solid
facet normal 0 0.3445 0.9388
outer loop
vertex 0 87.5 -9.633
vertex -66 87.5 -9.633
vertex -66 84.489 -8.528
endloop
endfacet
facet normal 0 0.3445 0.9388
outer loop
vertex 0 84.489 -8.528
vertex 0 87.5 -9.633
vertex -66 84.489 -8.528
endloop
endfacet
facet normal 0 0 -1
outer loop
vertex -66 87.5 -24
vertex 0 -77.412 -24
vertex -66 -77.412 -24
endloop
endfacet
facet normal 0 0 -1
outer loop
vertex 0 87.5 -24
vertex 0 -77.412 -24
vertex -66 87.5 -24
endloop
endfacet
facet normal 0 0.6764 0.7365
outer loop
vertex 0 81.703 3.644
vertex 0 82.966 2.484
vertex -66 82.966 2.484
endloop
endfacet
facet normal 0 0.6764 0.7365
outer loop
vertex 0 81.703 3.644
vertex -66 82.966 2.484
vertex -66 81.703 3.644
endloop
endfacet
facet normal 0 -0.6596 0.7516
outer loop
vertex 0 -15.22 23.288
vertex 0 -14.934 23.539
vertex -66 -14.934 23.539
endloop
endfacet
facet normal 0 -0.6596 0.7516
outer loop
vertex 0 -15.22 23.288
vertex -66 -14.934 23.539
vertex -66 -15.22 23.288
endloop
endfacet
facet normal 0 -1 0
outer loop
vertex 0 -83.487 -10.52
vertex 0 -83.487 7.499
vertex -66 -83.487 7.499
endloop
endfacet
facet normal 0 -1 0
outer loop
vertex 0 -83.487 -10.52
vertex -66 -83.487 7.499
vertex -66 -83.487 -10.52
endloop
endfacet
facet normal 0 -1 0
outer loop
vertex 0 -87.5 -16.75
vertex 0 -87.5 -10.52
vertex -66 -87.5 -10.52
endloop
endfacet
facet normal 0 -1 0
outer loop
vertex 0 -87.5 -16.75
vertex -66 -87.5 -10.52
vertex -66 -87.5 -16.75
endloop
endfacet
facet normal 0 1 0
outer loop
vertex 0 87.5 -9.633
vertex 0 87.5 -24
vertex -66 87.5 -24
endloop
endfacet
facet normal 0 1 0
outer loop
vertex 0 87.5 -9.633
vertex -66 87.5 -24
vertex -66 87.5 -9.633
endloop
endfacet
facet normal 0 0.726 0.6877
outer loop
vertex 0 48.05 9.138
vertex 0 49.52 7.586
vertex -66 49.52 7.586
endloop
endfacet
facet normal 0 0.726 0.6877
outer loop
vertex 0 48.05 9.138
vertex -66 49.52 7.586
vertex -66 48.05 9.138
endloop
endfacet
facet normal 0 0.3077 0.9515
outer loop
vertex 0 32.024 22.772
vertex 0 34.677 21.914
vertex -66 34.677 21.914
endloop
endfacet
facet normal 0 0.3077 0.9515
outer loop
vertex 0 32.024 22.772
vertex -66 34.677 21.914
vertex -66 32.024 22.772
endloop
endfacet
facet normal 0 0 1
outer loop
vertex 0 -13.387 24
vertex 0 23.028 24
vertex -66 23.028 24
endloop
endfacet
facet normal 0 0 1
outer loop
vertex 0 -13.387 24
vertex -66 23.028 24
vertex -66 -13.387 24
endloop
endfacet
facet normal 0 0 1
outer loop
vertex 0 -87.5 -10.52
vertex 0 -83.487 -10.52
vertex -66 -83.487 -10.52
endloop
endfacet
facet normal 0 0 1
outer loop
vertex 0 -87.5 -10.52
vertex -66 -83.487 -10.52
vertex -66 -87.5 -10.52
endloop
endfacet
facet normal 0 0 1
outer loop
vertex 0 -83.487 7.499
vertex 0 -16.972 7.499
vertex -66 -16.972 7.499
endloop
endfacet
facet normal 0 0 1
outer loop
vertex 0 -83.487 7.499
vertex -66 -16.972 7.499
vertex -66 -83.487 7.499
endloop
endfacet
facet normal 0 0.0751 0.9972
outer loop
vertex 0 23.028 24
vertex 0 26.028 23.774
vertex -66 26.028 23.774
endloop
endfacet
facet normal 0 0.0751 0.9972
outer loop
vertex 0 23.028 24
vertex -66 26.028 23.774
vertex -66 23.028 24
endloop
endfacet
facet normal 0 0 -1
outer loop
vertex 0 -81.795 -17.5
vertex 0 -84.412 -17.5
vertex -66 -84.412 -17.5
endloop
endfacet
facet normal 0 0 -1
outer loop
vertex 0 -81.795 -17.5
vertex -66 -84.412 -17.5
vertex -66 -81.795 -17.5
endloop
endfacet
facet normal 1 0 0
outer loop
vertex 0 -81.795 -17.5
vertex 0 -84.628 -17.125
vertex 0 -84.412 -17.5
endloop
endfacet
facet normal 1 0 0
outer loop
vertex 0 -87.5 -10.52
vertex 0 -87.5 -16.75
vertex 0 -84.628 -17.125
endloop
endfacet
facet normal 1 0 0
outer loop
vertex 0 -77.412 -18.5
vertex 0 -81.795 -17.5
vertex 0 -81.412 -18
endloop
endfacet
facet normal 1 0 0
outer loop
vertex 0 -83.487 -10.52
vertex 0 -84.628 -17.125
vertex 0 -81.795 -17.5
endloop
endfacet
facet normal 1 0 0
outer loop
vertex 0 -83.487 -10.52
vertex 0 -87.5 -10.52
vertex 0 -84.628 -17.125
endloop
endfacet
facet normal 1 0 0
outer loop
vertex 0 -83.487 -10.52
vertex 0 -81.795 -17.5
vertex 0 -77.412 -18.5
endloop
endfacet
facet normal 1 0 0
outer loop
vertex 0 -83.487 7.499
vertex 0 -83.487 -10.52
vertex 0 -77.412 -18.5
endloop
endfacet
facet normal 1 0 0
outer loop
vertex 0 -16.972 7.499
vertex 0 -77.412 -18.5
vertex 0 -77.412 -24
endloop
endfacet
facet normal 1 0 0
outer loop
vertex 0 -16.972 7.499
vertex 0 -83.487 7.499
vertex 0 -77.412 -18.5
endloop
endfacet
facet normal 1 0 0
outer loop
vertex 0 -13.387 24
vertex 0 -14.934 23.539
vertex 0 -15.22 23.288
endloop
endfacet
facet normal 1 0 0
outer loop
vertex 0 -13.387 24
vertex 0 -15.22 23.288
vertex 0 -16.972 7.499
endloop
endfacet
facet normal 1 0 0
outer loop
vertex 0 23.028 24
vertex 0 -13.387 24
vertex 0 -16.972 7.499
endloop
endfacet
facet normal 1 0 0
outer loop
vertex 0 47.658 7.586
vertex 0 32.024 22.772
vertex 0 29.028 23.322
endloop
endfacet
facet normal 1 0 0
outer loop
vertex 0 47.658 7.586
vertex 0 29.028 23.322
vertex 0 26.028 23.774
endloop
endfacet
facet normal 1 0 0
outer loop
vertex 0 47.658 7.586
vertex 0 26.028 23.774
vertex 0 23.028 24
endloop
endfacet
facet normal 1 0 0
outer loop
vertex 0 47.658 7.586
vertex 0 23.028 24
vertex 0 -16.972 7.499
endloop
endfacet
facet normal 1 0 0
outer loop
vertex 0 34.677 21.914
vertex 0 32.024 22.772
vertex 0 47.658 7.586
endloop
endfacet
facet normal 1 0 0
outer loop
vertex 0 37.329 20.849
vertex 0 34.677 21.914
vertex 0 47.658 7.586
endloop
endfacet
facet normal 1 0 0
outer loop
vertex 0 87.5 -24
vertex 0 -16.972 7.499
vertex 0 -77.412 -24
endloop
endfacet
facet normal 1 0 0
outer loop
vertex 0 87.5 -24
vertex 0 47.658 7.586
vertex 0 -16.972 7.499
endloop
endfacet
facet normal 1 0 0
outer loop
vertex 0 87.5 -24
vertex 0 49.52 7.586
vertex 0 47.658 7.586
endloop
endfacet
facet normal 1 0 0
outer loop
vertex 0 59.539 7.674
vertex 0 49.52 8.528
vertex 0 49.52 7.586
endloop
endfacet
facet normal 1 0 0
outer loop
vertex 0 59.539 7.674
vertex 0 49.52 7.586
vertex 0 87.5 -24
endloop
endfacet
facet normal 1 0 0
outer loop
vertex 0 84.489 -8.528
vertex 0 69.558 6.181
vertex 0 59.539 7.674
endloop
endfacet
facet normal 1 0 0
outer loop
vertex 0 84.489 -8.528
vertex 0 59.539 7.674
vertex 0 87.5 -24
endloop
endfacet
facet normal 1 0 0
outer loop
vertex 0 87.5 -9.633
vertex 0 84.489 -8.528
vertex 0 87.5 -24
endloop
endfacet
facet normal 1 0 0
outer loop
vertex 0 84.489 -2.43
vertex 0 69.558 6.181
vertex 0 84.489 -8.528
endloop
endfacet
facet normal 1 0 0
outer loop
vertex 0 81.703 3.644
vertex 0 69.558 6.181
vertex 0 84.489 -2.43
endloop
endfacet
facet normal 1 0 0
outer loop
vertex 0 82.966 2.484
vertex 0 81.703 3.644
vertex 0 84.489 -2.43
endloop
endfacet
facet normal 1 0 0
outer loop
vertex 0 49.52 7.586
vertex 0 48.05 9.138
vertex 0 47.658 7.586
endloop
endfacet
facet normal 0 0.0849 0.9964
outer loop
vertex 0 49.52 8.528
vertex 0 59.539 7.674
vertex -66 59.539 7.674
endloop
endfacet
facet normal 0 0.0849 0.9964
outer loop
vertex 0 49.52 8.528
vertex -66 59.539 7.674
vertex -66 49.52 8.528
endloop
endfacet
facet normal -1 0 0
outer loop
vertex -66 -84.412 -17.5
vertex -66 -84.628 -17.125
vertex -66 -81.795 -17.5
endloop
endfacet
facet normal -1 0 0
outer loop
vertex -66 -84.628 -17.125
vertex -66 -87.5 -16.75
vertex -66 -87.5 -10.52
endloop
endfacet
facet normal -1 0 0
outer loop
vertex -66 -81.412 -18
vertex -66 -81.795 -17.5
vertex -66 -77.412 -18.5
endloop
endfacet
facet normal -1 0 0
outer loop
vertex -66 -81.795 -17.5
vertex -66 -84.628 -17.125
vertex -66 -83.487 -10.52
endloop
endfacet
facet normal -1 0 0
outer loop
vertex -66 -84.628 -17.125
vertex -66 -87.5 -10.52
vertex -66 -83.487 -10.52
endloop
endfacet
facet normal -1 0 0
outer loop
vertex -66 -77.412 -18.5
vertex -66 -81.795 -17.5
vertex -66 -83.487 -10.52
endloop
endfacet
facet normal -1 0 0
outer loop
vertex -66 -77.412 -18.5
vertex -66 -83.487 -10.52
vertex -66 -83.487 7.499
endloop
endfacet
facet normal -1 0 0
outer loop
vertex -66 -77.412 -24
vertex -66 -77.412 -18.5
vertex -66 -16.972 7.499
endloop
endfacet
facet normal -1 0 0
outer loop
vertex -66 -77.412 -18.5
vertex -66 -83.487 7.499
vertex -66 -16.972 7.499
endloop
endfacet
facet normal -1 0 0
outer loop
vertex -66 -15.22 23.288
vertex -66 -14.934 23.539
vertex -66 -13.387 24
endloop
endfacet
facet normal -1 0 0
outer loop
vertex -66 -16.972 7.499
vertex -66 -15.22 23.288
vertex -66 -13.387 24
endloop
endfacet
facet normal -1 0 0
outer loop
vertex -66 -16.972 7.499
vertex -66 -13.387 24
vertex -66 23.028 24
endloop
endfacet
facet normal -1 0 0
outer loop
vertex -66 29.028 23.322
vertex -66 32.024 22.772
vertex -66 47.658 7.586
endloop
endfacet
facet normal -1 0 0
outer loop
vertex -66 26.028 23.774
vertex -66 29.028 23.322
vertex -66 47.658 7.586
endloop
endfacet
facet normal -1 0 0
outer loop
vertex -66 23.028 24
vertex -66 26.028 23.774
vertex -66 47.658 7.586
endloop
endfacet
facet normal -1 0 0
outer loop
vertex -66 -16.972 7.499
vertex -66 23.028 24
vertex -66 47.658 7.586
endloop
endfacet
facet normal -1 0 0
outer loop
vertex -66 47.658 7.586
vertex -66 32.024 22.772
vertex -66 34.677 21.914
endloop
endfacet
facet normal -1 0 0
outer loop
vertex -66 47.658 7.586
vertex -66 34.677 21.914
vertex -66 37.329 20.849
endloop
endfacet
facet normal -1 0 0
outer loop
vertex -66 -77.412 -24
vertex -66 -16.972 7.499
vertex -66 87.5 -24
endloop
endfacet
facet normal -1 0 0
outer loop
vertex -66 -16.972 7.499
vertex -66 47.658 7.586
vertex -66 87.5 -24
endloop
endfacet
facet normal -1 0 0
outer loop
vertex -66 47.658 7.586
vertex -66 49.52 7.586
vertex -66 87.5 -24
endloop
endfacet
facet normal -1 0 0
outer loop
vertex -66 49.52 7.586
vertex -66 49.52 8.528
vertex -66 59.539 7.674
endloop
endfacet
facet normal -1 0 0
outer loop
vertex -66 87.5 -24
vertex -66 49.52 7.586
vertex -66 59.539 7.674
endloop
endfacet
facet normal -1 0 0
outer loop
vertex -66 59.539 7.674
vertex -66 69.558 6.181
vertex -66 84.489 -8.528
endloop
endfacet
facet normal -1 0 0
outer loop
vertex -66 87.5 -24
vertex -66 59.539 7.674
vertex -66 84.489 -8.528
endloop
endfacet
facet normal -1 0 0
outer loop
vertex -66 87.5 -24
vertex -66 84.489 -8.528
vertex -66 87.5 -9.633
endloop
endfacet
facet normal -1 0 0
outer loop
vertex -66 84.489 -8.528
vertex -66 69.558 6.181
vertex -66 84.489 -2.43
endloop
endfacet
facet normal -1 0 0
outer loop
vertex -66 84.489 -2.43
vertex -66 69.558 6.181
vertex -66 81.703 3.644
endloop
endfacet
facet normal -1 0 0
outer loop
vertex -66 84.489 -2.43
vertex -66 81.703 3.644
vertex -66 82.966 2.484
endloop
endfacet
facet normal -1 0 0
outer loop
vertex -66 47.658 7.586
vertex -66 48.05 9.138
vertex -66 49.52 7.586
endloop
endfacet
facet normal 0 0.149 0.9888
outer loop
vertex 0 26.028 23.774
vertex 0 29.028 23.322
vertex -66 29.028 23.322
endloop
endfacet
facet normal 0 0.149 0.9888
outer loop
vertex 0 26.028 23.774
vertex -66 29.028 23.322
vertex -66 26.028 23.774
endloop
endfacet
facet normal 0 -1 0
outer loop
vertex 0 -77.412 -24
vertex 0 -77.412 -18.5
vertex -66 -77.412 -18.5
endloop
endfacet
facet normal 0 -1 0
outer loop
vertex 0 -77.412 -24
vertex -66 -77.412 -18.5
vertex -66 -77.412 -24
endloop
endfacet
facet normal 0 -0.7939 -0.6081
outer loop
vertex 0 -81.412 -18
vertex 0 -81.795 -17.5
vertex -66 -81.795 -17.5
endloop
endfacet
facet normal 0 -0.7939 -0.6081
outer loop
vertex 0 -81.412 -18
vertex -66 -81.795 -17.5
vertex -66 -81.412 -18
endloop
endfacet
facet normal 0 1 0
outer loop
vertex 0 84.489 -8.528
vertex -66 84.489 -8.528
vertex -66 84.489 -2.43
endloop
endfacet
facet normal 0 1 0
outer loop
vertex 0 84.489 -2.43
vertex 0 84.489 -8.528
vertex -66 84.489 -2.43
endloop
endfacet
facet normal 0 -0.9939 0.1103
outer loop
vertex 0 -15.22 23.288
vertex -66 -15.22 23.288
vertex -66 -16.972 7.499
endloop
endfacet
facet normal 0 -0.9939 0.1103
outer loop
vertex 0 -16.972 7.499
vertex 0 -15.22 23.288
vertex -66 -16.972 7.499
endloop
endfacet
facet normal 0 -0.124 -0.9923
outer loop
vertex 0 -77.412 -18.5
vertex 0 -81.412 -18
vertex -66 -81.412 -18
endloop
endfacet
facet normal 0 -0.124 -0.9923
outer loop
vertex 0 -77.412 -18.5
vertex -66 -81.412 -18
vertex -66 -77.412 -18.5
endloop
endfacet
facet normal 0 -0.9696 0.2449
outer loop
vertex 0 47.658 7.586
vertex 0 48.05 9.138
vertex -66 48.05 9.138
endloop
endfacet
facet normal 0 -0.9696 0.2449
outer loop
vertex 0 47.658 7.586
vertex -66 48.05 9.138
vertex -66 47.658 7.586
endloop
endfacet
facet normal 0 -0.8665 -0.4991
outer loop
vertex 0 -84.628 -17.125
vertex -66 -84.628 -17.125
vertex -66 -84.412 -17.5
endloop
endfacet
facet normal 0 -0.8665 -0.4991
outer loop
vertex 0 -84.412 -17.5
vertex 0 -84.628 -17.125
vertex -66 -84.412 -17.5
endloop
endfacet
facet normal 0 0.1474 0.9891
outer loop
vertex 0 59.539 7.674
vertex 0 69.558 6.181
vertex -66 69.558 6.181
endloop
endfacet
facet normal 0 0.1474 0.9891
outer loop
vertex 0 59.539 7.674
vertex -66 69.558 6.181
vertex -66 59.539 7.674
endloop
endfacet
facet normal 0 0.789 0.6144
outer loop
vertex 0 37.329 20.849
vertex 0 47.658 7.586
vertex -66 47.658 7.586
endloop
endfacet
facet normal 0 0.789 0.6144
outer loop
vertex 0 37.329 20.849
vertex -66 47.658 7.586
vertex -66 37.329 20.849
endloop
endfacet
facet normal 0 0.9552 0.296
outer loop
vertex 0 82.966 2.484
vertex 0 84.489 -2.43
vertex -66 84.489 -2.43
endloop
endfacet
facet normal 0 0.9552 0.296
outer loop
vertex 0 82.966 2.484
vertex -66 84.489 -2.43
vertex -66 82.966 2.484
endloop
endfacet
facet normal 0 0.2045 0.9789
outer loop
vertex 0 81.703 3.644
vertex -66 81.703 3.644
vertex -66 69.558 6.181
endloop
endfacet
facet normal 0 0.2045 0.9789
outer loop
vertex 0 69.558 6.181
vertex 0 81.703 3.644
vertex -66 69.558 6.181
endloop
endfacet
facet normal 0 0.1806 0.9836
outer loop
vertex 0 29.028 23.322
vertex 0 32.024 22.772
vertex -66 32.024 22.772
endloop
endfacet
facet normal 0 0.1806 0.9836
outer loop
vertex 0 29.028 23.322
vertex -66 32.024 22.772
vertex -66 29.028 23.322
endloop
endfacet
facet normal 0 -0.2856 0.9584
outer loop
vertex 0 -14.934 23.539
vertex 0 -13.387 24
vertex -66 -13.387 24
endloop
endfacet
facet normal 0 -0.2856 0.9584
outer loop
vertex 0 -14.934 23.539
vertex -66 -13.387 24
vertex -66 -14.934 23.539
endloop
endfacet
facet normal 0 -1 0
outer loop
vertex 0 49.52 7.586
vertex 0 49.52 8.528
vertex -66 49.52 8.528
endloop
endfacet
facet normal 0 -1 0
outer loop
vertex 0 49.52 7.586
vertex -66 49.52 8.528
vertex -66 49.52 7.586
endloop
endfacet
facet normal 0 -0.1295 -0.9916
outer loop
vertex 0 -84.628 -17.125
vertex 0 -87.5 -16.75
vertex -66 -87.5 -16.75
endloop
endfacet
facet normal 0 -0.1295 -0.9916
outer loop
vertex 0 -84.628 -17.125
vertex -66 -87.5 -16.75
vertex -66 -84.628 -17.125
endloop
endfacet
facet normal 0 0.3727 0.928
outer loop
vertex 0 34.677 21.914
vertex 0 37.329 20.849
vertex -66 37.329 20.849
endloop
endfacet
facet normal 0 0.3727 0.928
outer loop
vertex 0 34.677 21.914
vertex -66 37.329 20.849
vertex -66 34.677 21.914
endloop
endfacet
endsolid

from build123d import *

# Parameters (mm, degrees)
F1_DEPTH = 66


# Not quite as in the source:
# - a feature names something its author has since deleted; it is built from what else it names


with BuildPart() as f1:
    # F0 (on Right) → F1 (new body)
    with BuildSketch(Plane.YZ):
        Polygon((-77.412024796, -18.5), (-77.412024796, -24), (87.5, -24), (87.5, -9.63295158), (84.4892114401, -8.5281385109), (84.4892114401, -2.4295686744), (82.965940237, 2.4843649007), (81.7029699683, 3.644410288), (69.5578083396, 6.1807483435), (59.5387034118, 7.6740793884), (49.519598484, 8.5277827457), (49.519598484, 7.9152721193), (49.519598484, 7.5858309865), (48.0495102024, 9.1383457184), (47.6583614945, 7.5858309865), (37.3294272488, 20.848762244), (34.6766483518, 21.9144313596), (32.0238694549, 22.7722087875), (29.0279629678, 23.3218624368), (26.0279629678, 23.7739541456), (23.0279629678, 24), (-13.387337327, 24), (-14.9341821671, 23.5386695713), (-15.2199724689, 23.2877042145), (-16.9720370322, 7.4994475581), (-83.4866687655, 7.4994475581), (-83.4866687655, -10.5200763792), (-87.5, -10.5200763792), (-87.5, -16.75), (-84.6275396049, -17.125), (-84.412024796, -17.5), (-81.795014441, -17.5), (-81.412024796, -18), align=None)
    extrude(amount=-F1_DEPTH)


solid = f1.part
